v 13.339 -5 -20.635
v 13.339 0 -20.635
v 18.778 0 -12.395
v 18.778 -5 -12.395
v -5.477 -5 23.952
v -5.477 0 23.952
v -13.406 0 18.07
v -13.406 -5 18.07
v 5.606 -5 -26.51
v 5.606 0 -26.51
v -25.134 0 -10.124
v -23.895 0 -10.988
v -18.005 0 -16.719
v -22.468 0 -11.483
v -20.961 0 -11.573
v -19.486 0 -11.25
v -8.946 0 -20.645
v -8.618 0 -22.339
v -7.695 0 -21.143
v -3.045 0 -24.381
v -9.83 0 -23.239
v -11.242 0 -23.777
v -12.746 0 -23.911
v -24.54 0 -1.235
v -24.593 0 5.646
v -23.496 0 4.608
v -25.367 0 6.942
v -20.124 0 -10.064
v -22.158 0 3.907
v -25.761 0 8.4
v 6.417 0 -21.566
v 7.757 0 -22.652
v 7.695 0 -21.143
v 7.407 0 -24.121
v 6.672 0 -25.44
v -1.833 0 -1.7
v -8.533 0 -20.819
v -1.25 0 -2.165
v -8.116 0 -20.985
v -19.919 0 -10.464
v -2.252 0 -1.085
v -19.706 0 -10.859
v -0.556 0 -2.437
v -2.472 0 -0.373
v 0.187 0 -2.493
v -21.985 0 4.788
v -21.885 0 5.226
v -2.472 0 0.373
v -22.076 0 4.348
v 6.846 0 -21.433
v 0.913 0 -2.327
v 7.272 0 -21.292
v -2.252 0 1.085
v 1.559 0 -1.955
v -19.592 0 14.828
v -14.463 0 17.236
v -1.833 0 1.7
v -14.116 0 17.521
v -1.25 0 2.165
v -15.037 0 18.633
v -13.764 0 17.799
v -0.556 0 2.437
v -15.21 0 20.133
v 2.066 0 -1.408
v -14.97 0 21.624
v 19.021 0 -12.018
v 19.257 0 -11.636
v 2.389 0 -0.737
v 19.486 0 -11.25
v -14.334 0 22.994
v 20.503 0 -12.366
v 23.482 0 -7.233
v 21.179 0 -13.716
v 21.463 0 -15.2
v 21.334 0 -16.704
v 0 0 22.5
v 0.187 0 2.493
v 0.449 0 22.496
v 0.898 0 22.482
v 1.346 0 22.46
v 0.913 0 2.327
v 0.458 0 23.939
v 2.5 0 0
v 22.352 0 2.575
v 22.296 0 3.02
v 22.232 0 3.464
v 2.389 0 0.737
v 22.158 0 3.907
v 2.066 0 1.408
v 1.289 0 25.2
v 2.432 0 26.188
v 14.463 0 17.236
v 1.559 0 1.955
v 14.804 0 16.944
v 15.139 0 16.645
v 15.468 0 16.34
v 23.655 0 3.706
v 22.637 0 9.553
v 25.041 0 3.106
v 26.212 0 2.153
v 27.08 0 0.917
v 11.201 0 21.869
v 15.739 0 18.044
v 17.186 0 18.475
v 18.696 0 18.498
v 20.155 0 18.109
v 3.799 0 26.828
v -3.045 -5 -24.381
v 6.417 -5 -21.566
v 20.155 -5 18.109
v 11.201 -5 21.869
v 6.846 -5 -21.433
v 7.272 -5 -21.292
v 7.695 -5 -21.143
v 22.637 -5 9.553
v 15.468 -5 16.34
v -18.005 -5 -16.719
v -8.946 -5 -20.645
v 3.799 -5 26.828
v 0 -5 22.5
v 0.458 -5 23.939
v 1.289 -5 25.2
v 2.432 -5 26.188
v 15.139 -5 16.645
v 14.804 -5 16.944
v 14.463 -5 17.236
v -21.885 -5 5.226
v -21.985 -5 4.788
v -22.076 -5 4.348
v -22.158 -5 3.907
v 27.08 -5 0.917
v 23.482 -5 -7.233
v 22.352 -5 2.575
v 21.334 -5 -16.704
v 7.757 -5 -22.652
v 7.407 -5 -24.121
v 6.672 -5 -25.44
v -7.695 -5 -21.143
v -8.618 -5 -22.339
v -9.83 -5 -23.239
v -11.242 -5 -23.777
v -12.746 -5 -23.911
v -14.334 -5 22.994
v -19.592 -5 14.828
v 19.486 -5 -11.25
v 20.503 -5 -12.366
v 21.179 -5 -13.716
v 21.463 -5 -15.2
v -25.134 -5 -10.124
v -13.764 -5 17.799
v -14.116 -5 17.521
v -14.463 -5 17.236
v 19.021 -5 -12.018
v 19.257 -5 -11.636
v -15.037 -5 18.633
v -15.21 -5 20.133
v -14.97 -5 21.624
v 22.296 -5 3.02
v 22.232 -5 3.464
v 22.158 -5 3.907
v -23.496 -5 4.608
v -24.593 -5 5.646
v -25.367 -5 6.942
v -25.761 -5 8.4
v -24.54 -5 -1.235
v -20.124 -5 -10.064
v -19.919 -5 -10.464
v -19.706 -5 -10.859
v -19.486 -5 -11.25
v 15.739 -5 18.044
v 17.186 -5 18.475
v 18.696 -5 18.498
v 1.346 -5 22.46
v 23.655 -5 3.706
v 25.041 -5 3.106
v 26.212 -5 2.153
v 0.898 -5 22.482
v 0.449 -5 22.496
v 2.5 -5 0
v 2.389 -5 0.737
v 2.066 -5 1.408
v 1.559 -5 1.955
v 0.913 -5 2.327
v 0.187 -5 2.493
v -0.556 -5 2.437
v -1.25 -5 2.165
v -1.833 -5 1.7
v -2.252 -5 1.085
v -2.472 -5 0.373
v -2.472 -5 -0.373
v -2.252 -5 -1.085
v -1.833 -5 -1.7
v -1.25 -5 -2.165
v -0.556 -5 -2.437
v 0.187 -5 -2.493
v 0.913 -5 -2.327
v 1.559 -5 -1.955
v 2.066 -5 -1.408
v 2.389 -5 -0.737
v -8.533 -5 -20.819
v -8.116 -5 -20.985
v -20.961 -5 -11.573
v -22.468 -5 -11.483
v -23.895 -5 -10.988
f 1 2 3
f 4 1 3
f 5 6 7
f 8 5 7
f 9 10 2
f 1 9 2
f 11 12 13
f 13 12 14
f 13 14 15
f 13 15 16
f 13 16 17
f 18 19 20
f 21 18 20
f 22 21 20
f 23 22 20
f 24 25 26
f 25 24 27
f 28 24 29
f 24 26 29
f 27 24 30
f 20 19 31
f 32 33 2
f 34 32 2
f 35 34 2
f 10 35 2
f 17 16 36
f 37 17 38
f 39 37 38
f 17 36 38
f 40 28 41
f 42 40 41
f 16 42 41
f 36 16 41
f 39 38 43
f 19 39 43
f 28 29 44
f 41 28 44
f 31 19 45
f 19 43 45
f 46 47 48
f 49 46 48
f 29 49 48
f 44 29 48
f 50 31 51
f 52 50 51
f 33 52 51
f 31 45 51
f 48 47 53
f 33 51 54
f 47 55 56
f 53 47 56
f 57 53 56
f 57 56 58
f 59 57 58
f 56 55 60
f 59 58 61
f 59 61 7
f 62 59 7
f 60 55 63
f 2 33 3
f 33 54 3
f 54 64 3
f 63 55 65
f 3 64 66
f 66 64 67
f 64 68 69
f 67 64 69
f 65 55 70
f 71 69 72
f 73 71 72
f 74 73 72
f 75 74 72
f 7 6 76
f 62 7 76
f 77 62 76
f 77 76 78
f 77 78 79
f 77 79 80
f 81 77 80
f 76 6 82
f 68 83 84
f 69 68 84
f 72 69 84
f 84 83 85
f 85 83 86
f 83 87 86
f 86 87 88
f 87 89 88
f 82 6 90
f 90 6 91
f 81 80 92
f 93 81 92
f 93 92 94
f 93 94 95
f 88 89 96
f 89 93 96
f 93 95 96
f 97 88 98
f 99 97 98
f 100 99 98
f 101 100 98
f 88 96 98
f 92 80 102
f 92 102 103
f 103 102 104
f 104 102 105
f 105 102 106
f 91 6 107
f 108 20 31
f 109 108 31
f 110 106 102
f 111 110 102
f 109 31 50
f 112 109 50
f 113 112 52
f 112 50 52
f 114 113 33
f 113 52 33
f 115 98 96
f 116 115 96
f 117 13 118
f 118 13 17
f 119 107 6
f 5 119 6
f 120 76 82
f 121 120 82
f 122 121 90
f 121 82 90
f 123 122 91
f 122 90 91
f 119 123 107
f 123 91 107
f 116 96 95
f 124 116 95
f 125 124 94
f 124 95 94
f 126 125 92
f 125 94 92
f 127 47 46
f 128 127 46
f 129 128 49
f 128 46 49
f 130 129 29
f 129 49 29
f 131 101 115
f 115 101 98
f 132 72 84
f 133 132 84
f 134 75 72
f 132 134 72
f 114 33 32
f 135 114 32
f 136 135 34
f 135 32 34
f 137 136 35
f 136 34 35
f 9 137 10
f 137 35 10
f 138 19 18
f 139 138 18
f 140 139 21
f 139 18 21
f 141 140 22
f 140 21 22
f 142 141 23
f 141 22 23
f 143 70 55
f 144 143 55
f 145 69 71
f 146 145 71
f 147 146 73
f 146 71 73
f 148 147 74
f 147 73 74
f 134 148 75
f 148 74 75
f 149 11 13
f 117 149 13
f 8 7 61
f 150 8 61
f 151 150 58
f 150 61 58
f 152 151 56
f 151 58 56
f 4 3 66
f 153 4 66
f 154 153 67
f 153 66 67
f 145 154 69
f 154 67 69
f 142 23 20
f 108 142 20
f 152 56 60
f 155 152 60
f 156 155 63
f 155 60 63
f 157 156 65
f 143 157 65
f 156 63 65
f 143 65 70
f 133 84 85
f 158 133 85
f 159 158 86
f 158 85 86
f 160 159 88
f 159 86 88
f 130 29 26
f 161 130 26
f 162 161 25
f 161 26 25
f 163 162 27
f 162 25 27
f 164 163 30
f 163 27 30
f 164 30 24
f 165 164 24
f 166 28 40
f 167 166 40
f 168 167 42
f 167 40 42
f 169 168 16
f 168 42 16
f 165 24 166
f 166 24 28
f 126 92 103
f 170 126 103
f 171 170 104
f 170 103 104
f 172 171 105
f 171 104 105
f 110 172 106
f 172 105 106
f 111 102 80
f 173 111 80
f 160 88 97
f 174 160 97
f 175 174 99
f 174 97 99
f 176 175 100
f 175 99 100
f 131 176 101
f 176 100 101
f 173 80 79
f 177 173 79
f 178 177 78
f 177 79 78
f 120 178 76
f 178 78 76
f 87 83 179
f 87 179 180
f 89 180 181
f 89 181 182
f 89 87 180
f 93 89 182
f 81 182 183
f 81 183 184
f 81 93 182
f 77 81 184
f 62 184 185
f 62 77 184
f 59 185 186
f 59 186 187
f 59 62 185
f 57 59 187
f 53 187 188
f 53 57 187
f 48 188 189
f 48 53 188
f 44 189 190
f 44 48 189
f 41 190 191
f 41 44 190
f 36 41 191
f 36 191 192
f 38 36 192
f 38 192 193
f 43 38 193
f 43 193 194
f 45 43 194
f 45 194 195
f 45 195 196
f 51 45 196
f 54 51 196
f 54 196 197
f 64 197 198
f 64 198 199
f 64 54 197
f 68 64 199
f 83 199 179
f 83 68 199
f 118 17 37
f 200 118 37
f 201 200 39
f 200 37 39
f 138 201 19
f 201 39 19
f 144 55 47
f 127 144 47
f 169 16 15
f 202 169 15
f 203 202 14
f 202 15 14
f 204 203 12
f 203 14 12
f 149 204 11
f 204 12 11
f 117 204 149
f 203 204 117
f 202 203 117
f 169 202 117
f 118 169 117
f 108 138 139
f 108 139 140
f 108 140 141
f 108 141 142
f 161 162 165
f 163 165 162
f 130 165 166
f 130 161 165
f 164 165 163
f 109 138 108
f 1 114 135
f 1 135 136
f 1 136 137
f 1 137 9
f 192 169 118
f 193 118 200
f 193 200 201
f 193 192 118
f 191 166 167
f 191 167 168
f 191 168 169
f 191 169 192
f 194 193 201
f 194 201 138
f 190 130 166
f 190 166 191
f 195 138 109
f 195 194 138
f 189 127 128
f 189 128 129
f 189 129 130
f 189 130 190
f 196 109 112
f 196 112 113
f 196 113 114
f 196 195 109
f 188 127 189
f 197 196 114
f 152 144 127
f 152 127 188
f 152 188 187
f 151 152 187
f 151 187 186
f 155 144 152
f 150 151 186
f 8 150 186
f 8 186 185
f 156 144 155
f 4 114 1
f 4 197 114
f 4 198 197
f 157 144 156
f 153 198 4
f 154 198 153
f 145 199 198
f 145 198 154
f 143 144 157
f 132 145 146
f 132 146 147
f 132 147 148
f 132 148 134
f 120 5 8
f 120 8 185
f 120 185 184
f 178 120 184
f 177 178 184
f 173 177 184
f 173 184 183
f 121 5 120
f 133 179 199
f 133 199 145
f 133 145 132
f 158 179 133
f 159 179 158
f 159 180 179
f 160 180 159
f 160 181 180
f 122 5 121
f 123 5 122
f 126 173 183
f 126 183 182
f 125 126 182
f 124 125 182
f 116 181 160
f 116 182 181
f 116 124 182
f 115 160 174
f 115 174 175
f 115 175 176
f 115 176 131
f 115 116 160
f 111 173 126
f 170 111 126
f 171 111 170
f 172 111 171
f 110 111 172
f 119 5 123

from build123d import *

# Parameters (mm, degrees)
F0_R     = 2.5
F1_DEPTH = 5


# Not quite as in the source:
# - a feature names something its author has since deleted; it is built from what else it names


with BuildPart() as f1:
    # F0 (on Front) → F1 (new body)
    with BuildSketch(Plane.XZ):
        with BuildLine():
            ThreePointArc((19.4855715851, -11.25), (21.7333310915, -5.8234285148), (22.5, 0))
            ThreePointArc((22.5, 0), (22.4630219271, 1.2894362728), (22.3522092532, 2.5746342462))
            ThreePointArc((22.3522092532, 2.5746342462), (22.2651615708, 3.2423109389), (22.1581744428, 3.9070839975))
            ThreePointArc((22.1581744428, 3.9070839975), (19.8134723767, 10.6619094152), (15.4678426969, 16.3400074145))
            ThreePointArc((15.4678426969, 16.3400074145), (14.9719859982, 16.795524263), (14.4627212179, 17.2359999702))
            ThreePointArc((14.4627212179, 17.2359999702), (8.3246571453, 20.9033510092), (1.3459006368, 22.4597095145))
            ThreePointArc((1.3459006368, 22.4597095145), (0.6732517819, 22.489925123), (0, 22.5))
            ThreePointArc((0, 22.5), (-7.0593576826, 21.363882351), (-13.4058032893, 18.0702639208))
            ThreePointArc((-13.4058032893, 18.0702639208), (-13.9405044255, 17.6610400702), (-14.4627212179, 17.2359999702))
            ThreePointArc((-14.4627212179, 17.2359999702), (-19.1402205948, 11.8280157078), (-21.8847828674, 5.22554101))
            ThreePointArc((-21.8847828674, 5.22554101), (-22.0313436808, 4.568358088), (-22.1581744428, 3.9070839975))
            ThreePointArc((-22.1581744428, 3.9070839975), (-22.2651615708, -3.2423109389), (-20.1236293196, -10.0642706148))
            ThreePointArc((-20.1236293196, -10.0642706148), (-19.8134723767, -10.6619094152), (-19.4855715851, -11.25))
            ThreePointArc((-19.4855715851, -11.25), (-14.9719859982, -16.795524263), (-8.9464059639, -20.6448981671))
            ThreePointArc((-8.9464059639, -20.6448981671), (-8.3246571453, -20.9033510092), (-7.6954532248, -21.1430839677))
            ThreePointArc((-7.6954532248, -21.1430839677), (-0.6732517819, -22.489925123), (6.4169401705, -21.5655484245))
            ThreePointArc((6.4169401705, -21.5655484245), (7.0593576826, -21.363882351), (7.6954532248, -21.1430839677))
            ThreePointArc((7.6954532248, -21.1430839677), (13.9405044255, -17.6610400702), (18.7777286828, -12.3954388997))
            ThreePointArc((18.7777286828, -12.3954388997), (19.1402205948, -11.8280157078), (19.4855715851, -11.25))
        make_face()
        Circle(F0_R, mode=Mode.SUBTRACT)
        with BuildLine():
            ThreePointArc((-13.4058032893, 18.0702639208), (-7.0593576826, 21.363882351), (0, 22.5))
            ThreePointArc((0, 22.5), (1.2893242582, 25.1998179584), (3.7992770591, 26.8281640483))
            Line((3.7992770591, 26.8281640483), (-5.477073051, 23.9523583039))
            Line((-5.477073051, 23.9523583039), (-13.4058032893, 18.0702639208))
        make_face()
        with BuildLine():
            ThreePointArc((-21.8847828674, 5.22554101), (-19.1402205948, 11.8280157078), (-14.4627212179, 17.2359999702))
            ThreePointArc((-14.4627212179, 17.2359999702), (-15.2104510666, 20.1329421727), (-14.3343963619, 22.9936942077))
            Line((-14.3343963619, 22.9936942077), (-19.5919605158, 14.8279762838))
            Line((-19.5919605158, 14.8279762838), (-21.8847828674, 5.22554101))
        make_face()
        with BuildLine():
            Line((-24.5395519148, -1.2345806341), (-20.1236293196, -10.0642706148))
            ThreePointArc((-20.1236293196, -10.0642706148), (-22.2651615708, -3.2423109389), (-22.1581744428, 3.9070839975))
            ThreePointArc((-22.1581744428, 3.9070839975), (-24.5930872921, 5.6456389916), (-25.7608464161, 8.4002193008))
            Line((-25.7608464161, 8.4002193008), (-24.5395519148, -1.2345806341))
        make_face()
        with BuildLine():
            Line((-18.0048142462, -16.7194635525), (-8.9464059639, -20.6448981671))
            ThreePointArc((-8.9464059639, -20.6448981671), (-14.9719859982, -16.795524263), (-19.4855715851, -11.25))
            ThreePointArc((-19.4855715851, -11.25), (-22.4683446518, -11.4833214179), (-25.1335101323, -10.1238115749))
            Line((-25.1335101323, -10.1238115749), (-18.0048142462, -16.7194635525))
        make_face()
        with BuildLine():
            Line((-3.0454238906, -24.3811236585), (6.4169401705, -21.5655484245))
            ThreePointArc((6.4169401705, -21.5655484245), (-0.6732517819, -22.489925123), (-7.6954532248, -21.1430839677))
            ThreePointArc((-7.6954532248, -21.1430839677), (-9.8304138412, -23.2391081131), (-12.7459251298, -23.9107985011))
            Line((-12.7459251298, -23.9107985011), (-3.0454238906, -24.3811236585))
        make_face()
        with BuildLine():
            ThreePointArc((22.3522092532, 2.5746342462), (22.4630219271, 1.2894362728), (22.5, 0))
            ThreePointArc((22.5, 0), (21.7333310915, -5.8234285148), (19.4855715851, -11.25))
            ThreePointArc((19.4855715851, -11.25), (21.1790203936, -13.7164965405), (21.3342330732, -16.7043524734))
            Line((21.3342330732, -16.7043524734), (23.4818872972, -7.2328947514))
            Line((23.4818872972, -7.2328947514), (22.3522092532, 2.5746342462))
        make_face()
        with BuildLine():
            Line((13.3389541496, -20.6345850387), (18.7777286828, -12.3954388997))
            ThreePointArc((18.7777286828, -12.3954388997), (13.9405044255, -17.6610400702), (7.6954532248, -21.1430839677))
            ThreePointArc((7.6954532248, -21.1430839677), (7.4072768587, -24.1210578483), (5.6056198962, -26.5096570697))
            Line((5.6056198962, -26.5096570697), (13.3389541496, -20.6345850387))
        make_face()
        with BuildLine():
            ThreePointArc((1.3459006368, 22.4597095145), (8.3246571453, 20.9033510092), (14.4627212179, 17.2359999702))
            ThreePointArc((14.4627212179, 17.2359999702), (17.1858104334, 18.4754188566), (20.1552265199, 18.1094377689))
            Line((20.1552265199, 18.1094377689), (11.2005977653, 21.8691656728))
            Line((11.2005977653, 21.8691656728), (1.3459006368, 22.4597095145))
        make_face()
        with BuildLine():
            ThreePointArc((15.4678426969, 16.3400074145), (19.8134723767, 10.6619094152), (22.1581744428, 3.9070839975))
            ThreePointArc((22.1581744428, 3.9070839975), (25.0408649078, 3.1061659404), (27.0803214916, 0.9171042935))
            Line((27.0803214916, 0.9171042935), (22.6373844064, 9.5531473747))
            Line((22.6373844064, 9.5531473747), (15.4678426969, 16.3400074145))
        make_face()
    extrude(amount=F1_DEPTH)


solid = f1.part
